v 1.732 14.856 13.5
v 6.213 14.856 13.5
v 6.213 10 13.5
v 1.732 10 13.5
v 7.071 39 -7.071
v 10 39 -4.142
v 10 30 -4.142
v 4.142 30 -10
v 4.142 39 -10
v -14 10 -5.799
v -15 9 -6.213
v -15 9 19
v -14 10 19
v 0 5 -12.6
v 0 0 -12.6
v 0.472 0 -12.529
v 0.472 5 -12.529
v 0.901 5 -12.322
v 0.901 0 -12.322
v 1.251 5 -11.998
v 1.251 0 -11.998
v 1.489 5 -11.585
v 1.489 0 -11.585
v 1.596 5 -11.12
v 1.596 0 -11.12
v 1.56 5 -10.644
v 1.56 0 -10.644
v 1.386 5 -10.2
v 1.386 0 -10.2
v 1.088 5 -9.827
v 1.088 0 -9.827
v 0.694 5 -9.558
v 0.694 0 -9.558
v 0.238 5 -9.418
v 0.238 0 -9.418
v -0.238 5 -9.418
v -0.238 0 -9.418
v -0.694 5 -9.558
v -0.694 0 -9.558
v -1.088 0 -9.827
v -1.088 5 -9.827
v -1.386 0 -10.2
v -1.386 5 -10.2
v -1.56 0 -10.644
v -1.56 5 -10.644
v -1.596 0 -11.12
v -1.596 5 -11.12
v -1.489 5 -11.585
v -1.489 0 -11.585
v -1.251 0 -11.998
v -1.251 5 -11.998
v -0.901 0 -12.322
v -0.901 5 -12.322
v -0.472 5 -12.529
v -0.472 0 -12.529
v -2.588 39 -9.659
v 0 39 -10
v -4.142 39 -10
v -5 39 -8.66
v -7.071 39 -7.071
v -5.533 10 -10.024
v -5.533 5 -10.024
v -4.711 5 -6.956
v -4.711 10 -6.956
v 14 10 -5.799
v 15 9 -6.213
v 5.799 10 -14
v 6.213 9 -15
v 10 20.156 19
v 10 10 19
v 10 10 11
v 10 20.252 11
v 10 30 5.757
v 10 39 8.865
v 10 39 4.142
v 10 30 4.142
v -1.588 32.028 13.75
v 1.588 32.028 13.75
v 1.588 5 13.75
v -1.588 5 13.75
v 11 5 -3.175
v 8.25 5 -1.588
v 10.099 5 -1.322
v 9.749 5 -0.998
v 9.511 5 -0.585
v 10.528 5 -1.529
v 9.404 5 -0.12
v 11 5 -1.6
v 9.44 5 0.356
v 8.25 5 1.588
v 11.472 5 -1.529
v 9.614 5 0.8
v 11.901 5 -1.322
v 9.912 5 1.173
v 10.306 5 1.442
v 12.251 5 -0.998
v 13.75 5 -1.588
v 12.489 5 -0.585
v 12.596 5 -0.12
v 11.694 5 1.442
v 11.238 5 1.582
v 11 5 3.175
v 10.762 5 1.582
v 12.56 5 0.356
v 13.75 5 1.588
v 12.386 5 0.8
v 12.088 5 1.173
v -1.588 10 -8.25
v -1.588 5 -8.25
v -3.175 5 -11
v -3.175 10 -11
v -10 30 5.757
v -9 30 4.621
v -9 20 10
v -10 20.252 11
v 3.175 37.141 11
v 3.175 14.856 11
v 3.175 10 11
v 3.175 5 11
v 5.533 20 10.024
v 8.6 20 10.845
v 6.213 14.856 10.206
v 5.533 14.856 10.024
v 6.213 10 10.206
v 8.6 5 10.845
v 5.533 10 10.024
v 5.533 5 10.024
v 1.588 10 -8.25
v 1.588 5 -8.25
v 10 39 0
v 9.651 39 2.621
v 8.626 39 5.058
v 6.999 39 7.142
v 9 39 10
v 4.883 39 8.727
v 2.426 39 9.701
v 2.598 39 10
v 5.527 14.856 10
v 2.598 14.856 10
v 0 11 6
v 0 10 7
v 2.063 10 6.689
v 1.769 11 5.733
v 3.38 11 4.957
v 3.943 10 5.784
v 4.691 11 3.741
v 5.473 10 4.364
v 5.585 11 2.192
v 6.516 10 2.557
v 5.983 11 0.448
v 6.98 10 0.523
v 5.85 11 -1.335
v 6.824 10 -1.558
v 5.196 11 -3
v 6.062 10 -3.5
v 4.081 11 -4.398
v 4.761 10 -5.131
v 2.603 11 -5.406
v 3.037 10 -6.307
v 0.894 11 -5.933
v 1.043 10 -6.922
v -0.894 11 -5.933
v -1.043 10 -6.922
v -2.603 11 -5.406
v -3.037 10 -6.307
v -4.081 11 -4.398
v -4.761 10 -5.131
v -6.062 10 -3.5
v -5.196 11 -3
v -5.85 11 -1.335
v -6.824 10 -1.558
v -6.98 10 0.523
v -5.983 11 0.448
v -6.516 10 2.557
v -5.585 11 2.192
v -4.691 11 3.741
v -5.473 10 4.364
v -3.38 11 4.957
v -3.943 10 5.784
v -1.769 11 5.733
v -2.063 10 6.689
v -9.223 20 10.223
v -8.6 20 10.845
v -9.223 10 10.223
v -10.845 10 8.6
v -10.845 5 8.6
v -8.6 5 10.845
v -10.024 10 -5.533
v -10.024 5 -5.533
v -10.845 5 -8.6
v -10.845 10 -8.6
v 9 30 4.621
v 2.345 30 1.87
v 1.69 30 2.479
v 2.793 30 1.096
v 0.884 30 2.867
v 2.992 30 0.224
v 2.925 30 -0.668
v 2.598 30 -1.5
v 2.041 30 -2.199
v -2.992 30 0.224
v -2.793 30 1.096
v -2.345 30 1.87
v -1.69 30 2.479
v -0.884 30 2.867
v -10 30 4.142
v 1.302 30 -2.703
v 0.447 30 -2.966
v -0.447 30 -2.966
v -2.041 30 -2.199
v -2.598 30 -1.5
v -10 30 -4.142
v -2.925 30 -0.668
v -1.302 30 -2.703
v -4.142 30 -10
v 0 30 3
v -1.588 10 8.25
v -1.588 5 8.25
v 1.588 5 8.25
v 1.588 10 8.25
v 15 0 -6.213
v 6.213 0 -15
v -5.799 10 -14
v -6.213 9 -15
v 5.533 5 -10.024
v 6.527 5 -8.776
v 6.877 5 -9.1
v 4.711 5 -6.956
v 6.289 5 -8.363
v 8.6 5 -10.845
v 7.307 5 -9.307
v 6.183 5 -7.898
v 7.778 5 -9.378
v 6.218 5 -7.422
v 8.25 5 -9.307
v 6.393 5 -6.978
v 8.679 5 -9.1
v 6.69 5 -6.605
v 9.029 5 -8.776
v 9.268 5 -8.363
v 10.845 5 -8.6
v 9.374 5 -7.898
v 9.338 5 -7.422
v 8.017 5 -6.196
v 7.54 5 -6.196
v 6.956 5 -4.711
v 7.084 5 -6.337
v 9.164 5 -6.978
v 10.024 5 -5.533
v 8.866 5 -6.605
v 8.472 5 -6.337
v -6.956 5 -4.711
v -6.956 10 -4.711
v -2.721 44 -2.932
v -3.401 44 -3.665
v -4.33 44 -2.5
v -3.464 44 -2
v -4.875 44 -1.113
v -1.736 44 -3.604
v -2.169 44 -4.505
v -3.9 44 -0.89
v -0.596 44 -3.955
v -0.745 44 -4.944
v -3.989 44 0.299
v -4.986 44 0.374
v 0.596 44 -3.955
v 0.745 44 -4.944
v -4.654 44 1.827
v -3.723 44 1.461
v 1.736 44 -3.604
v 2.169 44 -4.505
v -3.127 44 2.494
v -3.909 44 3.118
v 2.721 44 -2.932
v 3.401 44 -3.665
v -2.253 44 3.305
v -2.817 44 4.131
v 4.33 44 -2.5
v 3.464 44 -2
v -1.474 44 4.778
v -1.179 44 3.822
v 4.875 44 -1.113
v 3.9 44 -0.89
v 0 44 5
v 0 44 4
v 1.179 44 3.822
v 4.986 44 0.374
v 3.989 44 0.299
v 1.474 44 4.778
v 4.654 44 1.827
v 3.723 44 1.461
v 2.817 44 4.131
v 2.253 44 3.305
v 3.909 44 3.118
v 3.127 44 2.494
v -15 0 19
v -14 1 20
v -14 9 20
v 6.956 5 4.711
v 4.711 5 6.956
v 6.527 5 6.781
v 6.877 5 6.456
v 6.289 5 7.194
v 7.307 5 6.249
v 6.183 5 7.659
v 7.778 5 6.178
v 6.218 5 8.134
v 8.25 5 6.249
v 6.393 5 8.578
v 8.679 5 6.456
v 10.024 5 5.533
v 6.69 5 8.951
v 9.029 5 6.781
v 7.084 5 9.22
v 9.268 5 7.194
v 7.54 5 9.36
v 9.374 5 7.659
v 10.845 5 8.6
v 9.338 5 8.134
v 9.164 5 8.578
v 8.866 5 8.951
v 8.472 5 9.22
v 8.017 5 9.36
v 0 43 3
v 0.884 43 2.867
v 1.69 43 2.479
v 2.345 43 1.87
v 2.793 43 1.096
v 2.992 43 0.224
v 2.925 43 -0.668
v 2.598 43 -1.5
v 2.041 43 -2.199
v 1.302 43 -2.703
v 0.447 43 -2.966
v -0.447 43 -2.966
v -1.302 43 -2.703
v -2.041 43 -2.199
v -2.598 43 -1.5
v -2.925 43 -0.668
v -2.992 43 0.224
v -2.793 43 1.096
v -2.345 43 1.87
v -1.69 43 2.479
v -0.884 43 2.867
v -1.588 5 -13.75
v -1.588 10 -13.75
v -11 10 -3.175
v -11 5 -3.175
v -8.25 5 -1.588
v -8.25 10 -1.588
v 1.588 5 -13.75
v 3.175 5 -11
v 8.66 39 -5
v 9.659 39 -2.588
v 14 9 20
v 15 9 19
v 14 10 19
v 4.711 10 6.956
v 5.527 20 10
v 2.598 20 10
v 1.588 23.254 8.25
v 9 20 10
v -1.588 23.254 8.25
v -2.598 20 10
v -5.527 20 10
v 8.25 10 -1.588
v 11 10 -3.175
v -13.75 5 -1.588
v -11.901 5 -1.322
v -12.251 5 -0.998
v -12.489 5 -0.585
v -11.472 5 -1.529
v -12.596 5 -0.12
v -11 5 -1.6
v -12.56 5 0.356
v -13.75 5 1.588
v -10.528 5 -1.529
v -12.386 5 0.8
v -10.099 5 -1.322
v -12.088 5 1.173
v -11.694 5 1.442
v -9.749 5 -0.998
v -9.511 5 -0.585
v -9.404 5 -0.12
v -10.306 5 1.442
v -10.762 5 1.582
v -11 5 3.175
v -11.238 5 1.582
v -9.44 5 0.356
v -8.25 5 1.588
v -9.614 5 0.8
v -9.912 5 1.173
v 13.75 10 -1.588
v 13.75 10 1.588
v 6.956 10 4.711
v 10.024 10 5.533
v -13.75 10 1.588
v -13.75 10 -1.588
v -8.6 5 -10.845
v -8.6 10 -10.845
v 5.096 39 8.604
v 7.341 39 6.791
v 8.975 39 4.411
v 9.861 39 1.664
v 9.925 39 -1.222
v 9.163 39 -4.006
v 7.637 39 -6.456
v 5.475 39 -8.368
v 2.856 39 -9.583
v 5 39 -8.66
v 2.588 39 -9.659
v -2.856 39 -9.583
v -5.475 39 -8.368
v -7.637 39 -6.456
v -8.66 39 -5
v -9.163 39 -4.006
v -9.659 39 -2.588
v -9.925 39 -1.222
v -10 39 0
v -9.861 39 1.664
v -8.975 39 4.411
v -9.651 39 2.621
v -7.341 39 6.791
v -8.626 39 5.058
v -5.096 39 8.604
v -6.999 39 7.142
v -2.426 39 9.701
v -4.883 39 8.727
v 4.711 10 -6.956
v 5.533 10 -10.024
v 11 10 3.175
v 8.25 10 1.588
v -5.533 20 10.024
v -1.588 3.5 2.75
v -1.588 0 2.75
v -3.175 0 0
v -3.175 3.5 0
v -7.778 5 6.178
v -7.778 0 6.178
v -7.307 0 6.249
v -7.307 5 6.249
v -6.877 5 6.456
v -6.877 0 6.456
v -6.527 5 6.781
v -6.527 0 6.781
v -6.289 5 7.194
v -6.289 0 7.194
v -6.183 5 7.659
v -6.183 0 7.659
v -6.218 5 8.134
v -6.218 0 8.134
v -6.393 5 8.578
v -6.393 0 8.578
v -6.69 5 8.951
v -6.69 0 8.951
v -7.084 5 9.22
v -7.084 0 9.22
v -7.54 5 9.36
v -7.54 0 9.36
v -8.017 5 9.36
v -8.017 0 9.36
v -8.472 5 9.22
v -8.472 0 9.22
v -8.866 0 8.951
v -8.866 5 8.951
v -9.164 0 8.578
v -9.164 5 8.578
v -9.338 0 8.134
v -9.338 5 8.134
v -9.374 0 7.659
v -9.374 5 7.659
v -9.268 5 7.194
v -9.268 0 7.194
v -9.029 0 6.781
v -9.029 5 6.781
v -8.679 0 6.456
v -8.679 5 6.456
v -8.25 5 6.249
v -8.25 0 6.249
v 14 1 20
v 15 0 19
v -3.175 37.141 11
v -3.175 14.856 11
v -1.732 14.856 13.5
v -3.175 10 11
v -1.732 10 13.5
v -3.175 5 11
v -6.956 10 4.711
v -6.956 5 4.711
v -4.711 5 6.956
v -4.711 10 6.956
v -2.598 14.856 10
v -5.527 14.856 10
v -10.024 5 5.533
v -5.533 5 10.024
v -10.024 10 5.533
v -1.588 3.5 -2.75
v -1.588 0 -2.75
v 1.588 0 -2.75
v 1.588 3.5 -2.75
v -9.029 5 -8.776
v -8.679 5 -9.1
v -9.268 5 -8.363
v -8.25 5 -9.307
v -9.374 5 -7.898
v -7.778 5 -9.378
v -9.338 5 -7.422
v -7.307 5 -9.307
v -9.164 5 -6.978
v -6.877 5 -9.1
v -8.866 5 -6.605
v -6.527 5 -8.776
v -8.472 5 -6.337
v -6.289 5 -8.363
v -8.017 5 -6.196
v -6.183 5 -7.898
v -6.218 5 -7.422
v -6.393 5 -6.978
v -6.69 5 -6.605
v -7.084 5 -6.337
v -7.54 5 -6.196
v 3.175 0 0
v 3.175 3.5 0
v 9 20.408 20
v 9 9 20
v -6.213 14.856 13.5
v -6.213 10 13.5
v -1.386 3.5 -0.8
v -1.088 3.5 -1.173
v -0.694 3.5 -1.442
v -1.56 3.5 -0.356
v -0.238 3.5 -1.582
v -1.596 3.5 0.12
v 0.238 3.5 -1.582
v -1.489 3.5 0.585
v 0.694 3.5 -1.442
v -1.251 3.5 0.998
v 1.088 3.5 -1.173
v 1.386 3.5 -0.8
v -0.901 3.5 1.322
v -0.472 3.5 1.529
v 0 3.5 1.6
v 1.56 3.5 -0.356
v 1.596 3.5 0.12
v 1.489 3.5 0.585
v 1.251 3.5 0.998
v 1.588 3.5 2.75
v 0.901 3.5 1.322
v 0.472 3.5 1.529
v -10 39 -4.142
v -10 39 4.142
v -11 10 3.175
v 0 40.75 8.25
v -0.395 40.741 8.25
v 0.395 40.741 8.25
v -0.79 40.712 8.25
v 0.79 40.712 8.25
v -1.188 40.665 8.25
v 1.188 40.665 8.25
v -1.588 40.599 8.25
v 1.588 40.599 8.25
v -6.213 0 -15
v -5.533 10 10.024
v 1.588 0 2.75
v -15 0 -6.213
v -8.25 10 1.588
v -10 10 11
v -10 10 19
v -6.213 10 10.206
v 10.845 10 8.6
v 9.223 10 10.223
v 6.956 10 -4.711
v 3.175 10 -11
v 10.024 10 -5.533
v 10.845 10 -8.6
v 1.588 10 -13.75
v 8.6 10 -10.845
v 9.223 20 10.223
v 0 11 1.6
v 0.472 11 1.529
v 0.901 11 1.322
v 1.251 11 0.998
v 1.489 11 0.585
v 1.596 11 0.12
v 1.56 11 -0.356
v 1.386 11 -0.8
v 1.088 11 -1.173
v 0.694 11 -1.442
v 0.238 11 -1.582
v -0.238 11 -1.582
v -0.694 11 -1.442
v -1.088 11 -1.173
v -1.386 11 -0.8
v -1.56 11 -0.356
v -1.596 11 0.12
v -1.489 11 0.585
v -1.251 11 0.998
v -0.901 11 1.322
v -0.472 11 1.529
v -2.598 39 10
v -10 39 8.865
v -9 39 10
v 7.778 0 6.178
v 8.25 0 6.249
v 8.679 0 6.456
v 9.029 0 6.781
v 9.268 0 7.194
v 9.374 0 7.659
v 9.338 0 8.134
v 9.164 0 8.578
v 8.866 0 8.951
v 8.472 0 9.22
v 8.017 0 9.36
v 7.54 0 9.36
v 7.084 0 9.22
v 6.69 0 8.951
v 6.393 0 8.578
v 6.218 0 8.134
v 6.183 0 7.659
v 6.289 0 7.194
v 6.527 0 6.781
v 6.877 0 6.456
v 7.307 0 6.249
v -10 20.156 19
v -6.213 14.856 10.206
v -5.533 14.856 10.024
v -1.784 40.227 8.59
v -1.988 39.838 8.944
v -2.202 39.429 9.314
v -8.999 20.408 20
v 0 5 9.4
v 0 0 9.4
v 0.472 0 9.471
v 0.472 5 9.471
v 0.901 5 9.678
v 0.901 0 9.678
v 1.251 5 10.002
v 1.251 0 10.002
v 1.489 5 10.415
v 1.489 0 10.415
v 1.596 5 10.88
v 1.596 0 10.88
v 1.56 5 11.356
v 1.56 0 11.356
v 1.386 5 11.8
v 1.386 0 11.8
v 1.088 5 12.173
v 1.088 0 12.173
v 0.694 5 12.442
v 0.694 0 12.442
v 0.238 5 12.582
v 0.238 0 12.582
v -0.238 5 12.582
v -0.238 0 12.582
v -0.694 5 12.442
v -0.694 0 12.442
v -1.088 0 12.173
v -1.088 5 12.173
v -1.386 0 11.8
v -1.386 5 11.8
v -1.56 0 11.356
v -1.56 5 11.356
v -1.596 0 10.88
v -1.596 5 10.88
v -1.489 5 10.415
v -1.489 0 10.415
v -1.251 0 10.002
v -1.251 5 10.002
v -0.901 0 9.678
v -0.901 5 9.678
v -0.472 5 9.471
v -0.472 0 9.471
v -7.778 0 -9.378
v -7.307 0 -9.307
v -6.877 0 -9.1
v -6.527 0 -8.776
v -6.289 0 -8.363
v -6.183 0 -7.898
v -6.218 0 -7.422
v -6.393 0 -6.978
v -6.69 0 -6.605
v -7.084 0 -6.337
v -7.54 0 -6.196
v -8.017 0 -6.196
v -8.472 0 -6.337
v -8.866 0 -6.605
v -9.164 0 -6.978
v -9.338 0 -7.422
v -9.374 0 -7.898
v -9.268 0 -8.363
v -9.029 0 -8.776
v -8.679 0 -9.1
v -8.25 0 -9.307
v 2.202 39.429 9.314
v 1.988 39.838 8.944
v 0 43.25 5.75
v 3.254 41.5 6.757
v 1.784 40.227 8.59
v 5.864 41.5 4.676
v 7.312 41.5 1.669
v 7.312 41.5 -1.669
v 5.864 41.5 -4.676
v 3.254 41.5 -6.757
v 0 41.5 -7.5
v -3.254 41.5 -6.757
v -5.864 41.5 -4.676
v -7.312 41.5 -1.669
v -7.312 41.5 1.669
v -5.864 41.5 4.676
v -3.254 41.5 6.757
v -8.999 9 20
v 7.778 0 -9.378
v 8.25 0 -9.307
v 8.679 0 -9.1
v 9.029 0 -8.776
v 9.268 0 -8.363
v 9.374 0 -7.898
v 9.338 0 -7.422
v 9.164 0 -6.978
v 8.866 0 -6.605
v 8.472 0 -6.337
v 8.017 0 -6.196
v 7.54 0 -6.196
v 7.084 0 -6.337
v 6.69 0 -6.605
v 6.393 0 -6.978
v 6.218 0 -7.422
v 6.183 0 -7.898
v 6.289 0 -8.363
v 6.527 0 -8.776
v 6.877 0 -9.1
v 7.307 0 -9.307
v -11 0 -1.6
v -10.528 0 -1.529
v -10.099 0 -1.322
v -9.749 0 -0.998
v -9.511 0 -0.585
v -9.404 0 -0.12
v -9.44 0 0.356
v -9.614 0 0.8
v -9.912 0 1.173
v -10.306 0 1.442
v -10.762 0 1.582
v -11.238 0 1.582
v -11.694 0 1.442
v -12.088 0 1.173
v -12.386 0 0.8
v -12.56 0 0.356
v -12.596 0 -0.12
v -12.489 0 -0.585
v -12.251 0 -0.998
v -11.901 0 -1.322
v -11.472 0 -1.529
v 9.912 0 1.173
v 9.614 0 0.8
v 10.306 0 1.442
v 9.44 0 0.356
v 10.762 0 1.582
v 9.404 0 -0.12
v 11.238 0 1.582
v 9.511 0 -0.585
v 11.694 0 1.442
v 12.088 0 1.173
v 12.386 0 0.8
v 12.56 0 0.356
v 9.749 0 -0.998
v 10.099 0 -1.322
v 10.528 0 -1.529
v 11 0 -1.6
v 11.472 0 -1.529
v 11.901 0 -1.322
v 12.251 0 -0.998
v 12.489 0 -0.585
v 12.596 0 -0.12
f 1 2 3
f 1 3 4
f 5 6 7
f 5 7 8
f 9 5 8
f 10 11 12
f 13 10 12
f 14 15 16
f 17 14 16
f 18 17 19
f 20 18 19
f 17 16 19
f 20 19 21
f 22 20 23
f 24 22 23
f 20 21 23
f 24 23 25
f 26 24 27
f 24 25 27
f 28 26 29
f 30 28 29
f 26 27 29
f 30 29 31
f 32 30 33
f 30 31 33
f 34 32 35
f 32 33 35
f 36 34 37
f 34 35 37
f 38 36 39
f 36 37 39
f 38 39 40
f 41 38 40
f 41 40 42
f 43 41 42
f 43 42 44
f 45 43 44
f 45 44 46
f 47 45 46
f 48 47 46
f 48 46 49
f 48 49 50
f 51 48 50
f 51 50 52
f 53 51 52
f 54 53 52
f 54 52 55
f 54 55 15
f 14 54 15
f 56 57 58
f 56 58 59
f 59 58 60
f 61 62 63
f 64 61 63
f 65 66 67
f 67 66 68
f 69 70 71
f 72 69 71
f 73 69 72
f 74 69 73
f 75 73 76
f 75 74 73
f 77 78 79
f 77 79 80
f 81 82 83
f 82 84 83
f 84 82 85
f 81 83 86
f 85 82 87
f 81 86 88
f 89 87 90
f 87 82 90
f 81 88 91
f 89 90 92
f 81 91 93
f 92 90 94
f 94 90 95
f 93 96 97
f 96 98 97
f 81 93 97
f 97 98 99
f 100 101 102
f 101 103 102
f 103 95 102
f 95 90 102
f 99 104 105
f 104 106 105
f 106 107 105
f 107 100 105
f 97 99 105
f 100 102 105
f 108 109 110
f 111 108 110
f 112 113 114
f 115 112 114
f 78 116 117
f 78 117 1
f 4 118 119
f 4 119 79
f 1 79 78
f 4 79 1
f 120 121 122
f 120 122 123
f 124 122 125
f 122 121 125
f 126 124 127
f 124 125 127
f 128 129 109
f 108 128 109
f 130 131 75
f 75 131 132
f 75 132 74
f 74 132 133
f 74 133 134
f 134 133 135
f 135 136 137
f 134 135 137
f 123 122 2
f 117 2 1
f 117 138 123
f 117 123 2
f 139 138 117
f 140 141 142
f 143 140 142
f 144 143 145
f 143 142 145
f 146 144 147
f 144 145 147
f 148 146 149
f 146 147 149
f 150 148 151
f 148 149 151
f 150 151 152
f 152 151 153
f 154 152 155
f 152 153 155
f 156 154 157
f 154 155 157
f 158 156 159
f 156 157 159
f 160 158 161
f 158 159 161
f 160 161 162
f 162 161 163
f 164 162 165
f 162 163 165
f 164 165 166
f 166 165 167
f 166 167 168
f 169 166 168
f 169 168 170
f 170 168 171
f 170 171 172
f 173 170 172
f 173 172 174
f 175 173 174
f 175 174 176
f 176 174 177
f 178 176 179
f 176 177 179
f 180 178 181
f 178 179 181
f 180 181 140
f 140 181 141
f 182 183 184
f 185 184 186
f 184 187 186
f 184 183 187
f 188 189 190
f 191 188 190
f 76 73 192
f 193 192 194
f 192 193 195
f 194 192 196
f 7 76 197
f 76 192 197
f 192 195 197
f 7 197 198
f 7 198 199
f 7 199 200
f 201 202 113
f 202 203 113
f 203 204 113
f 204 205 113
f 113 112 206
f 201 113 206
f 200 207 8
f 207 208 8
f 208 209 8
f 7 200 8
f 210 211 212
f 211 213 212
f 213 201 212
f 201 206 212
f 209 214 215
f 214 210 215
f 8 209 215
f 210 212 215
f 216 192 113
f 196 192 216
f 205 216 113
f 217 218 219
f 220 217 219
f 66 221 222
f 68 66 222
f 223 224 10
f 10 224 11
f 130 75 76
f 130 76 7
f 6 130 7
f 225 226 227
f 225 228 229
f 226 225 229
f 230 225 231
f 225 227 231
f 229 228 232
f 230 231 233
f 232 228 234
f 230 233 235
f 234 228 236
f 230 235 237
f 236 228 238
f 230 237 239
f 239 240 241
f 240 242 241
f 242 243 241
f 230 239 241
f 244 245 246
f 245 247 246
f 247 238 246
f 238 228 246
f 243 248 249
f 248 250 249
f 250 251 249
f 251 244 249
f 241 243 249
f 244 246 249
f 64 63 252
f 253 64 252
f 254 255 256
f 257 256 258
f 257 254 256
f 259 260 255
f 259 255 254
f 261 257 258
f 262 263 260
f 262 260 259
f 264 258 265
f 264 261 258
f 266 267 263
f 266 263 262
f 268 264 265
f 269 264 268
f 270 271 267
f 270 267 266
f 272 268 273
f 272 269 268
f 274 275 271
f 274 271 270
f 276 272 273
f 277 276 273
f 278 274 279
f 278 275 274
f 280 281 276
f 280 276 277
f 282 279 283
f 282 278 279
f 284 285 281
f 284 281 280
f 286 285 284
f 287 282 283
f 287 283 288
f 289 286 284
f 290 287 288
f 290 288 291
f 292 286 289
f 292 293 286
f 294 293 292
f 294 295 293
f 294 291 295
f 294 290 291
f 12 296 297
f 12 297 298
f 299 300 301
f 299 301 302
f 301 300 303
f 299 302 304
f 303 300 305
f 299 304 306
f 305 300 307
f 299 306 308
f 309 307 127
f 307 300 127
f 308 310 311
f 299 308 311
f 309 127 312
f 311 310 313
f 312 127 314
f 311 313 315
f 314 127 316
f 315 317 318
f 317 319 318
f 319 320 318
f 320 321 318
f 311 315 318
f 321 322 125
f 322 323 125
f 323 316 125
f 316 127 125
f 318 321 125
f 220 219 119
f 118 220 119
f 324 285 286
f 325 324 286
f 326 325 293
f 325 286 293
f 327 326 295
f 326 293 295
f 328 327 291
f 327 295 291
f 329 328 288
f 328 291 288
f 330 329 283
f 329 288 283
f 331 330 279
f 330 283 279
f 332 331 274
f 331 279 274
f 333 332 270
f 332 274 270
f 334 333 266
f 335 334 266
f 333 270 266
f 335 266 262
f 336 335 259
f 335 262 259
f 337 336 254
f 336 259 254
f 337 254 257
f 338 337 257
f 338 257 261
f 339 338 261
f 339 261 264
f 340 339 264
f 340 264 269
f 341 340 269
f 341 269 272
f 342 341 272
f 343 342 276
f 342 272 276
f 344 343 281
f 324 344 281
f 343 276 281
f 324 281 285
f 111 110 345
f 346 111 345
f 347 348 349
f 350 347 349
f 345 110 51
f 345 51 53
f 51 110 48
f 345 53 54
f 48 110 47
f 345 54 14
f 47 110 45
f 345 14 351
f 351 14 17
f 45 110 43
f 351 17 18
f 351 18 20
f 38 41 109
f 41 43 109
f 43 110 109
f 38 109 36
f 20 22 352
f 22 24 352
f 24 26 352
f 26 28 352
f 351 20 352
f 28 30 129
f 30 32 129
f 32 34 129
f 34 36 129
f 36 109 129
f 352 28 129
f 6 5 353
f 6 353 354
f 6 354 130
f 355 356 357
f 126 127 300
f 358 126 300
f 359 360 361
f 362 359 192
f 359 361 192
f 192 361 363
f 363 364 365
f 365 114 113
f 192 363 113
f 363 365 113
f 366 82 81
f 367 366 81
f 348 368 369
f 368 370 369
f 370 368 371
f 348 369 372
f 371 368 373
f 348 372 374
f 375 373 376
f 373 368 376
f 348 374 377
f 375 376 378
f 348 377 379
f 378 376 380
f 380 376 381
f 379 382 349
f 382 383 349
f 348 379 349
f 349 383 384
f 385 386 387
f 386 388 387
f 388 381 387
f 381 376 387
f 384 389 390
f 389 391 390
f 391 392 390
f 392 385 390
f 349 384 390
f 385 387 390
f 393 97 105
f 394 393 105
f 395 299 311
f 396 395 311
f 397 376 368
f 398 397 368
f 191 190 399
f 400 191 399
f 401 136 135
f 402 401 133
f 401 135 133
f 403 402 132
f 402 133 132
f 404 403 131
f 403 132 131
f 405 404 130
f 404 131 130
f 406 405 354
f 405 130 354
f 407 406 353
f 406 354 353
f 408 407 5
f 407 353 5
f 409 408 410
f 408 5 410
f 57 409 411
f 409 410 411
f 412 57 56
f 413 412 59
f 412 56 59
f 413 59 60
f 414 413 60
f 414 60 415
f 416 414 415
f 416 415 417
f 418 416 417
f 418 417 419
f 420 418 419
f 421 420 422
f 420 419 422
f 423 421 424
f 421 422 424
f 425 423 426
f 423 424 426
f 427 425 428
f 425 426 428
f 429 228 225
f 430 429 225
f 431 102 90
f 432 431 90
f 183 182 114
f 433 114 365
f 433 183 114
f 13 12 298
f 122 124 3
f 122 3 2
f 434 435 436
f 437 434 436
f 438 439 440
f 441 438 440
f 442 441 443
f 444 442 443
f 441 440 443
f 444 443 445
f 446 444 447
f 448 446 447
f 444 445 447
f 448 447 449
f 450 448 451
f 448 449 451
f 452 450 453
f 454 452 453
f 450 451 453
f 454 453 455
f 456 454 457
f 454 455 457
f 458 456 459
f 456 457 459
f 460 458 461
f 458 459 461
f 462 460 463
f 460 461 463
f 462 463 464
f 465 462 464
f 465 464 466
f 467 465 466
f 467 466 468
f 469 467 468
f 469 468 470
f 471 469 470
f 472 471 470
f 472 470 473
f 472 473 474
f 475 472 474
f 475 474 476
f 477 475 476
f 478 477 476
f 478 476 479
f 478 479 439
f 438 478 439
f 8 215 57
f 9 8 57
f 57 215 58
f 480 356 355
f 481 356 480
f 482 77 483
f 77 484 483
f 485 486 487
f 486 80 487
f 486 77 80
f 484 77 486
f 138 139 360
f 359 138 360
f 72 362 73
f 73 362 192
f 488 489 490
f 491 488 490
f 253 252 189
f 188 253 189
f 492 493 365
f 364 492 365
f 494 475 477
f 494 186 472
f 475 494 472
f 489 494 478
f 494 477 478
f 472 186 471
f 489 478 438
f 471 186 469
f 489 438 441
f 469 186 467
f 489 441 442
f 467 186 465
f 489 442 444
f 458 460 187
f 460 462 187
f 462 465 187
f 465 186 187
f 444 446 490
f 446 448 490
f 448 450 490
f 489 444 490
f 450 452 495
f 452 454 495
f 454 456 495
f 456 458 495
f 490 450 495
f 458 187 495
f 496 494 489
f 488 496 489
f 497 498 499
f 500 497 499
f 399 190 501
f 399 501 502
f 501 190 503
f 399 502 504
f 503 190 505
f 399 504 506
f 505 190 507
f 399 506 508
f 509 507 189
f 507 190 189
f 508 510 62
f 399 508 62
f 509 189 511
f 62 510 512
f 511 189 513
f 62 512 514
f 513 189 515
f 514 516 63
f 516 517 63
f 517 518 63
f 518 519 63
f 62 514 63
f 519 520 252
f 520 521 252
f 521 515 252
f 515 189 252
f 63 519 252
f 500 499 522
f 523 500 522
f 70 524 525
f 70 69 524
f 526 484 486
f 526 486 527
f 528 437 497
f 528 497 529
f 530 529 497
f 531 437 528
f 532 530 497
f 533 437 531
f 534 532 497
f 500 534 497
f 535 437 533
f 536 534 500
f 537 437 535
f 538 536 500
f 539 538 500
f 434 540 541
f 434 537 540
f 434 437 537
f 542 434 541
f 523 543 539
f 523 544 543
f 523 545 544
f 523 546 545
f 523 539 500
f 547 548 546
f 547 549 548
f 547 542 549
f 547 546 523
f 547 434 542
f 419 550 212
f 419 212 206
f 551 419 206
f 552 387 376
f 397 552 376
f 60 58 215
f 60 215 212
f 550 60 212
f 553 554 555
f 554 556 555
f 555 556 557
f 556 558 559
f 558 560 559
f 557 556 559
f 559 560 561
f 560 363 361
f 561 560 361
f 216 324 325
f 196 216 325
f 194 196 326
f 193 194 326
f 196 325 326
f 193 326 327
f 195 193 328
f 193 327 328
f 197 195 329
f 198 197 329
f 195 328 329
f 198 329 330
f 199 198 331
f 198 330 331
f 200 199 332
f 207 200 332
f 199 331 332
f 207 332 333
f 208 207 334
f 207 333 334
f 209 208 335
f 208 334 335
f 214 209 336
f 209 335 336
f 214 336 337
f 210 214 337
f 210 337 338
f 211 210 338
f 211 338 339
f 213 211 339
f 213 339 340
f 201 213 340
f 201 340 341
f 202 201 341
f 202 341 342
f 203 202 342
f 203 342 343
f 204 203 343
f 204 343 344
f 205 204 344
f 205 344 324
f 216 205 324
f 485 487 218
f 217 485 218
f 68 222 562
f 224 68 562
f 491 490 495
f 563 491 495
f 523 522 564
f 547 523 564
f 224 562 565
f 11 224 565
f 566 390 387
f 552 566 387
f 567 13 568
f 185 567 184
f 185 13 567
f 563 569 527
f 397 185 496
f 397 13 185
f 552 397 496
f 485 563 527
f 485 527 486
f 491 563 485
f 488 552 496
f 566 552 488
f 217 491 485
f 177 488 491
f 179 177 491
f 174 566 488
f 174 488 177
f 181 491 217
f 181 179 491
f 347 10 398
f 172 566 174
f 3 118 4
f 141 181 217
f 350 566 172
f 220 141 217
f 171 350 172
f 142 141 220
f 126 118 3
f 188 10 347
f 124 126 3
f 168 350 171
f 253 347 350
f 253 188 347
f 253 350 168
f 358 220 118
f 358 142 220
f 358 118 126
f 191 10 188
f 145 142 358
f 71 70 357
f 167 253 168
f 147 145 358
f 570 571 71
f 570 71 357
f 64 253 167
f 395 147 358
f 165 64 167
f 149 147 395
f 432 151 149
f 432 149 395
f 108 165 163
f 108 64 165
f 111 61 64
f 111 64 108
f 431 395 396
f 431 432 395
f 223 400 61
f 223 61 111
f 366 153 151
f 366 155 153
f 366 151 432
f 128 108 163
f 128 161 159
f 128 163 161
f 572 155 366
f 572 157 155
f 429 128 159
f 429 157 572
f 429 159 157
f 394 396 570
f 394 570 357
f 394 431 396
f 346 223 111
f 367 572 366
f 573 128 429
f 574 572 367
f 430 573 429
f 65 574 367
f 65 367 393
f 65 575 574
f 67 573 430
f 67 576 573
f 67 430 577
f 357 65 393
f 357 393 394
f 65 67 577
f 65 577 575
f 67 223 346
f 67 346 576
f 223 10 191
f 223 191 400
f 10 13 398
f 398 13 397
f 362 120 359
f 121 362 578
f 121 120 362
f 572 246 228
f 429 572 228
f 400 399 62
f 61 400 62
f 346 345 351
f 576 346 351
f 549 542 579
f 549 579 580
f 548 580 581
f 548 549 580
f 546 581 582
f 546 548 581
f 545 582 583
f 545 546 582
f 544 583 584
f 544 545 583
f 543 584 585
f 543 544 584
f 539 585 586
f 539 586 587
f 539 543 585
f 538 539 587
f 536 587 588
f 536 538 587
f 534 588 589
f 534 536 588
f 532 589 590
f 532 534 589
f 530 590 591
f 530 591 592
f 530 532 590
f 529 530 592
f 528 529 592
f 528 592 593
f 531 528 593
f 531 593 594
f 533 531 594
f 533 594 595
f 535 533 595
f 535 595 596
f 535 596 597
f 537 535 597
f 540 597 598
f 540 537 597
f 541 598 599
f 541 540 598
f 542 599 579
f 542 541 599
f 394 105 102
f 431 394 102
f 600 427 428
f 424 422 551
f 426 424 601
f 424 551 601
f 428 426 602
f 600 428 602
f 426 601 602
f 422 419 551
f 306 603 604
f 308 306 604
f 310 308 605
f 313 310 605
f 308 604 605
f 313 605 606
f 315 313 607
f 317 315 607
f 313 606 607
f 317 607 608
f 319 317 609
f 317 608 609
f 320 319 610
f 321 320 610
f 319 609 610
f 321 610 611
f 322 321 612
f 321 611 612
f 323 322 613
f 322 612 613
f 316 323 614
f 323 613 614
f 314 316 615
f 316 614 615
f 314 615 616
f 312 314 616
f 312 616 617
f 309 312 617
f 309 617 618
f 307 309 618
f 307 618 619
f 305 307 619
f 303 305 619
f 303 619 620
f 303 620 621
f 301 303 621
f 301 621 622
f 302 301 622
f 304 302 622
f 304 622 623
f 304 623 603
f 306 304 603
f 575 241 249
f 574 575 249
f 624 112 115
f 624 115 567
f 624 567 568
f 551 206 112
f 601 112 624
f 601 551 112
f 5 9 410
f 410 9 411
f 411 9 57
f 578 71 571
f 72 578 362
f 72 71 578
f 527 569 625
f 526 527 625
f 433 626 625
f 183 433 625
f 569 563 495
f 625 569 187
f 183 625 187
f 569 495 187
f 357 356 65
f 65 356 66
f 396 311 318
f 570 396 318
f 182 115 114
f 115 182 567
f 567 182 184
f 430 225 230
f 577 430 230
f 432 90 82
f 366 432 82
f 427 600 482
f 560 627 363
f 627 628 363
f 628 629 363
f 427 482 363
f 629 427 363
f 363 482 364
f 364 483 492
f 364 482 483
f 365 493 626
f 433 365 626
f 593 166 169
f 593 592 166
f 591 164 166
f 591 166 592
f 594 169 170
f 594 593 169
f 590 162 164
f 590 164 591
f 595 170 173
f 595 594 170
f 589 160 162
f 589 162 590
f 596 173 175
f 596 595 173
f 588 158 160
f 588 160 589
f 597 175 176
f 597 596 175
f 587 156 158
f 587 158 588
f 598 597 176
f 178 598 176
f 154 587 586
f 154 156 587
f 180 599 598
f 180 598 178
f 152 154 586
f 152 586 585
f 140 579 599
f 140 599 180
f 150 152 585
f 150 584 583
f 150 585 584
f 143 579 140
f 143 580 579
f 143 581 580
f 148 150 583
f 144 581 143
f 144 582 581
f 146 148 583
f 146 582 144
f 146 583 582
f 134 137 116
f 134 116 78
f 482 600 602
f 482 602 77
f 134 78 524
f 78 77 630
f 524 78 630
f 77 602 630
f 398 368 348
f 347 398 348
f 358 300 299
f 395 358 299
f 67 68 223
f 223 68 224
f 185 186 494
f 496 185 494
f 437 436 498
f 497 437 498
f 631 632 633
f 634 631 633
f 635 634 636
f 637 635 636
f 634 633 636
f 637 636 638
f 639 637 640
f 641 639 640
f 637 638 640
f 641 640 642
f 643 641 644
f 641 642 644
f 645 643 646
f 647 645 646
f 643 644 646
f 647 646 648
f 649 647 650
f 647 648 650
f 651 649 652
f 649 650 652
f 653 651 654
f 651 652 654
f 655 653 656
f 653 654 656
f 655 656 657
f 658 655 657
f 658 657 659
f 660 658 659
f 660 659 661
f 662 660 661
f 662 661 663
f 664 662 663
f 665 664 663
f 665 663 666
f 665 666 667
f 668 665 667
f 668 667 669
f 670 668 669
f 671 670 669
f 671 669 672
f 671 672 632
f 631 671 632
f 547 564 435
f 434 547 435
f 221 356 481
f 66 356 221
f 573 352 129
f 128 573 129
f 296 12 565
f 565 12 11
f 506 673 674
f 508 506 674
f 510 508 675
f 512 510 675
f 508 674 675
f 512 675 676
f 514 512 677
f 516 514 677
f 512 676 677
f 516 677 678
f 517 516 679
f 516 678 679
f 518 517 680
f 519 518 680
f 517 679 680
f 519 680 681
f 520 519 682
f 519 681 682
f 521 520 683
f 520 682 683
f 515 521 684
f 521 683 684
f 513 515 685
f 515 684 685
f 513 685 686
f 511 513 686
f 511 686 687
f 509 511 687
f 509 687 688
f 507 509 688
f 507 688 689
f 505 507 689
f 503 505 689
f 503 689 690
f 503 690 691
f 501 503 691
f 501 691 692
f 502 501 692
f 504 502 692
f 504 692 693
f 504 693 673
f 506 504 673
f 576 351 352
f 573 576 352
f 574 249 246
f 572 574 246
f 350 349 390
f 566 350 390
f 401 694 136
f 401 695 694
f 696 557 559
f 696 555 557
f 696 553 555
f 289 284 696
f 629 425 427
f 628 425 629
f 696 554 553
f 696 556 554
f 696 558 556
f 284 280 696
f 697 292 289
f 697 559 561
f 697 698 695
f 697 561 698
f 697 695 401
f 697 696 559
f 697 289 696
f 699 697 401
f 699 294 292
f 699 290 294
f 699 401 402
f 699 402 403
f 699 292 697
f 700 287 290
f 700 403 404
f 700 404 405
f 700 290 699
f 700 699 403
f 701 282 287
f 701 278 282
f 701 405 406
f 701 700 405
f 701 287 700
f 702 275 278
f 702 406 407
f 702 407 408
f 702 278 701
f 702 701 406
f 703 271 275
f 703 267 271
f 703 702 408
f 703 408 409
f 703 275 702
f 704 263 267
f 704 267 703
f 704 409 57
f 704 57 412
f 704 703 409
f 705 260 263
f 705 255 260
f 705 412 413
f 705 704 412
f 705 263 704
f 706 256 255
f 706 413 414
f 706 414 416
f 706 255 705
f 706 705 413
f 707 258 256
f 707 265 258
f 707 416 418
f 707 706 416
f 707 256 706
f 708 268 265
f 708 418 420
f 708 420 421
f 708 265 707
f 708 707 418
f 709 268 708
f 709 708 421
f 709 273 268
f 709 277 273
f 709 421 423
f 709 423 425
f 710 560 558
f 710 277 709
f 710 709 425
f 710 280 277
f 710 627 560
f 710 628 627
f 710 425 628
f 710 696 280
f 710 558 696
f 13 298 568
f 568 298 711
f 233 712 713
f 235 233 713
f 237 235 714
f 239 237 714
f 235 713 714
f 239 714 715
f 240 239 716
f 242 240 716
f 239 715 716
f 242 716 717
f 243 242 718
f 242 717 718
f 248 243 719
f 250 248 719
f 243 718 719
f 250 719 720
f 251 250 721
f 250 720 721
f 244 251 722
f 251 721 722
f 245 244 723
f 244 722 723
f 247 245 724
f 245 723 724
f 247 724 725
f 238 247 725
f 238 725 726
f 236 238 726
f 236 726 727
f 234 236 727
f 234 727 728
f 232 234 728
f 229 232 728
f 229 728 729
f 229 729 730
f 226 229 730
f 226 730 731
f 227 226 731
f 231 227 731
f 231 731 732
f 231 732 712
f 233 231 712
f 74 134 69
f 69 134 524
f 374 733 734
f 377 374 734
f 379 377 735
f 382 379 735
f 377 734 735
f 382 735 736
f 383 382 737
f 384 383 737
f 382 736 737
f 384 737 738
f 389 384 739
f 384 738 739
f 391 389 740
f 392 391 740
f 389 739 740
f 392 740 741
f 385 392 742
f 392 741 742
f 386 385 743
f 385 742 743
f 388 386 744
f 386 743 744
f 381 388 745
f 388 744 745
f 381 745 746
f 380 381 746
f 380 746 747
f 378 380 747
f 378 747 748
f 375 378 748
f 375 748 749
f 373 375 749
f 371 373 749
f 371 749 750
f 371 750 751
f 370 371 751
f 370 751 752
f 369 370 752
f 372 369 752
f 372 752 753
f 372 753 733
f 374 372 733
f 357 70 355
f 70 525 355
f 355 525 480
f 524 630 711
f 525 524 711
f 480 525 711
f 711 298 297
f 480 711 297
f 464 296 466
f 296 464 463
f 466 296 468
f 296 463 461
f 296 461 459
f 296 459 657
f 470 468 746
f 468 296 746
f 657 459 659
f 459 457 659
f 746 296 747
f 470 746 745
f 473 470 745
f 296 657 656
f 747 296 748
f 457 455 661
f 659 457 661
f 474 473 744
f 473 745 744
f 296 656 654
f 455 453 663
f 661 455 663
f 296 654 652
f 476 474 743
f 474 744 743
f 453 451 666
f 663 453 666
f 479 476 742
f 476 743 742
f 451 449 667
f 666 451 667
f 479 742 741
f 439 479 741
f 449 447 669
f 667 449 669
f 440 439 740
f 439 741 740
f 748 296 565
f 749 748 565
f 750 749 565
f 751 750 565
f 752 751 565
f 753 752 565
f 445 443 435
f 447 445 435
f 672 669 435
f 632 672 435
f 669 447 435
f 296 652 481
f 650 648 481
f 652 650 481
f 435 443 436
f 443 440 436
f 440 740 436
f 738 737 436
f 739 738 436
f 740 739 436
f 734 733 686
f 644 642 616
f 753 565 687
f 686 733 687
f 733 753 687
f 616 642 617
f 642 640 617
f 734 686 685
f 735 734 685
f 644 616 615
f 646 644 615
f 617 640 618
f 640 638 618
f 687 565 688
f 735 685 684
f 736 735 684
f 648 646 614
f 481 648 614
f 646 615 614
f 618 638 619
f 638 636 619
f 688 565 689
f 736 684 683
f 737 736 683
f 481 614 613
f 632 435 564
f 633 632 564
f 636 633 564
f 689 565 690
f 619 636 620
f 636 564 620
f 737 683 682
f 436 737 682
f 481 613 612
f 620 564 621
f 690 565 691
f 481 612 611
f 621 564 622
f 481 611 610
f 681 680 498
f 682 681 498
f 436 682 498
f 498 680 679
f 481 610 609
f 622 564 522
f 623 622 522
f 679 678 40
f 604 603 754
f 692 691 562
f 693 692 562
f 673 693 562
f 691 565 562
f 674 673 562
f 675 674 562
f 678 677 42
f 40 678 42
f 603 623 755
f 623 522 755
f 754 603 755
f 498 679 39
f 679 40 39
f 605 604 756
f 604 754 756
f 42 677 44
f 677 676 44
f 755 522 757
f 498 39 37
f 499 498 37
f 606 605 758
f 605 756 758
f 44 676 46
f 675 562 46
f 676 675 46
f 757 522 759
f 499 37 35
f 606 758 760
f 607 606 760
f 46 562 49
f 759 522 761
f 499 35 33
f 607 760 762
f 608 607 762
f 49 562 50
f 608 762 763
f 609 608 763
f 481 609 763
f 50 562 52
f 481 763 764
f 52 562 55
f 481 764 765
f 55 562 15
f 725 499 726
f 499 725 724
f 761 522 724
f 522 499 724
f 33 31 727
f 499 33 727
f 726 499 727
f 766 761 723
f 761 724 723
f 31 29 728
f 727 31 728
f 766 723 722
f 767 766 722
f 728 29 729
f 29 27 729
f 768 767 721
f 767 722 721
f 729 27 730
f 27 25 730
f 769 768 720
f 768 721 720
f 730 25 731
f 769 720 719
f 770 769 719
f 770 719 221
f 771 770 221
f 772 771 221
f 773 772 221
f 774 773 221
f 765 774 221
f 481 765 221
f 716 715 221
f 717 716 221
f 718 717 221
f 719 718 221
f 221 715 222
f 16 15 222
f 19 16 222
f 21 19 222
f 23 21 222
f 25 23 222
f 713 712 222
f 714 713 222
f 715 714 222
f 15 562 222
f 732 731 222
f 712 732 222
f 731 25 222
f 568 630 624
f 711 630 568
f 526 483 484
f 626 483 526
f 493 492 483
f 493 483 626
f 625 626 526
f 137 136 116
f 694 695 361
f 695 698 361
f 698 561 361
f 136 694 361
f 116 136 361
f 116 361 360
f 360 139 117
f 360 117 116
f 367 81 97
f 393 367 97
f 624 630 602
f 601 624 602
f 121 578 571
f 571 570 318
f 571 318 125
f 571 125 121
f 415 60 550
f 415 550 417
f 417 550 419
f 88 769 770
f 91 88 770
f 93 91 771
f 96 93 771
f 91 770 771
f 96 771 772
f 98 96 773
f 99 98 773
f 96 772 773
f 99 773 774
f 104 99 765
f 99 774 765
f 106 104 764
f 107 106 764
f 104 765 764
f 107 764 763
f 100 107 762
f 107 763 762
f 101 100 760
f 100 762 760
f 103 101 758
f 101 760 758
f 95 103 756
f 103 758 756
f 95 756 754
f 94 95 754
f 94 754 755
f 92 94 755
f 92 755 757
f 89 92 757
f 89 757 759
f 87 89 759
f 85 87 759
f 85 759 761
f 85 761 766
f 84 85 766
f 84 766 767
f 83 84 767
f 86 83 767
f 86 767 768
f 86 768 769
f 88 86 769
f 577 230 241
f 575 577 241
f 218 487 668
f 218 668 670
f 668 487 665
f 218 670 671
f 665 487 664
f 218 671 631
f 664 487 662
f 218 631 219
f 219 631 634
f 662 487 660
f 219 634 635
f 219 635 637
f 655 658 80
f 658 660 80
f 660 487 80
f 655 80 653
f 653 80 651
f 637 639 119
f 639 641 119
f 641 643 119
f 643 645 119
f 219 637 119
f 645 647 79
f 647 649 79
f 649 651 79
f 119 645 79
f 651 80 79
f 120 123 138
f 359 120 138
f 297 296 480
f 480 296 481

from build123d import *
from OCP.BRepFilletAPI import BRepFilletAPI_MakeChamfer

# Parameters (mm, degrees)
CROQUIS1_R              = 1.6
SALIENTE_EXTRUIR1_DEPTH = 10
SALIENTE_EXTRUIR2_DEPTH = 30
CROQUIS12_W             = 12.426406872
CROQUIS12_H             = 4.855948251
CORTAR_EXTRUIR7_DEPTH   = 3.5
CROQUIS3_OUTSIDE_W      = 44.076
CROQUIS3_OUTSIDE_H      = 49.076
CROQUIS3_OUTSIDE_R      = 1.6
CORTAR_EXTRUIR1_DEPTH   = 29
CROQUIS4_R              = 10
SALIENTE_EXTRUIR3_DEPTH = 5
CHAFL_N1_SIZE           = 5
CROQUIS6_R              = 1.6
CORTAR_EXTRUIR3_DEPTH   = 10
CROQUIS8_R              = 6
CROQUIS8_R_2            = 1.6
SALIENTE_EXTRUIR4_DEPTH = 1
CHAFL_N2_SIZE           = 1
CROQUIS5_R              = 3
CORTAR_EXTRUIR4_DEPTH   = 33
CHAFL_N3_SIZE           = 1
CHAFL_N3_SIZE2          = 1.000027611
CHAFL_N3_SIZE2_2        = 1.000000257
CHAFL_N3_SIZE2_3        = 0.999999743
CHAFL_N3_SIZE2_4        = 0.999999708
CHAFL_N3_SIZE2_5        = 1.000000292
CHAFL_N3_SIZE2_6        = 0.999968652
CHAFL_N3_SIZE2_7        = 0.999972392
CHAFL_N3_SIZE2_8        = 1.000031351
CORTAR_EXTRUIR5_START   = -5
CORTAR_EXTRUIR5_DEPTH   = 15
CORTAR_EXTRUIR8_DEPTH   = 48.759815826
CHAFL_N4_SIZE           = 1
CORTAR_EXTRUIR6_DEPTH   = 3.5


with BuildPart() as part:
    # Croquis1 → Saliente-Extruir1 (new body)
    with BuildSketch(Plane(origin=(0, 0, 0), x_dir=(1, 0, 0), z_dir=(0, 1, 0))):
        Polygon((-15, -6.213203436), (-15, -20), (15, -20), (15, -6.213203436), (15, 6.213203436), (6.213203436, 15), (-6.213203436, 15), (-15, 6.213203436), align=None)
        with Locations(Location((0, 0, 0), (0, 0, 270))):
            Circle(CROQUIS1_R, mode=Mode.SUBTRACT)
    extrude(amount=SALIENTE_EXTRUIR1_DEPTH)

    # Croquis2 → Saliente-Extruir2 (add)
    with BuildSketch(Plane.ZY.offset(15)):
        Polygon((10, 20), (4.621471258, 30), (-10, 30), (-10, 39), (10, 39), (20, 20.407554966), (20, 10), (10, 10), align=None)
    extrude(amount=-SALIENTE_EXTRUIR2_DEPTH)

    # Croquis12 → Cortar-Extruir7 (cut)
    with BuildSketch(Plane(origin=(0, 0, 10), x_dir=(-1, 0, 0), z_dir=(0, 0, -1))):
        with Locations((0, 12.427974126)):
            Rectangle(CROQUIS12_W, CROQUIS12_H)
    extrude(amount=-CORTAR_EXTRUIR7_DEPTH, mode=Mode.SUBTRACT)

    # Croquis3 outside → Cortar-Extruir1 (cut)
    # profile 1 of 2: a face of its own
    with BuildSketch(Plane(origin=(0, 39, 0), x_dir=(1, 0, 0), z_dir=(0, 1, 0))):
        with Locations((0, -2.5)):
            Rectangle(CROQUIS3_OUTSIDE_W, CROQUIS3_OUTSIDE_H)
        Polygon((-10, -4.142135624), (-9.999502859, -20), (9.999995364, -20), (10, -4.142135624), (10, 4.142135624), (4.142135624, 10), (-4.142135624, 10), (-10, 4.142135624), align=None, mode=Mode.SUBTRACT)
    # profile 2 of 2: a face of its own
    with BuildSketch(Plane(origin=(0, 39, 0), x_dir=(1, 0, 0), z_dir=(0, 1, 0))):
        with Locations(Location((0, 0, 0), (0, 0, 270))):
            Circle(CROQUIS3_OUTSIDE_R)
    extrude(amount=-CORTAR_EXTRUIR1_DEPTH, mode=Mode.SUBTRACT)

    # Croquis4 → Saliente-Extruir3 (add)
    with BuildSketch(Plane(origin=(0, 39, 0), x_dir=(1, 0, 0), z_dir=(0, 1, 0))):
        with Locations(Location((0, 0, 0), (0, 0, 270))):
            Circle(CROQUIS4_R)
    extrude(amount=SALIENTE_EXTRUIR3_DEPTH)

    # Chaflán1
    chafl_n1_edges = [part.edges().sort_by_distance(p)[0] for p in [
        (0, 44, -10),
    ]]
    chamfer(chafl_n1_edges, length=CHAFL_N1_SIZE - 0.0001)  # a hair under: the kernel refuses the full size

    # Croquis6 → Cortar-Extruir3 (cut)
    with BuildSketch(Plane.XZ):
        with Locations(Location((0, 11, 0), (0, 0, 270))):
            Circle(CROQUIS6_R)
        with Locations(Location((7.778174593, 7.778174593, 0), (0, 0, 270))):
            Circle(CROQUIS6_R)
        with Locations(Location((11, 0, 0), (0, 0, 270))):
            Circle(CROQUIS6_R)
        with Locations(Location((7.778174593, -7.778174593, 0), (0, 0, 270))):
            Circle(CROQUIS6_R)
        with Locations(Location((0, -11, 0), (0, 0, 270))):
            Circle(CROQUIS6_R)
        with Locations(Location((-7.778174593, -7.778174593, 0), (0, 0, 270))):
            Circle(CROQUIS6_R)
        with Locations(Location((-11, 0, 0), (0, 0, 270))):
            Circle(CROQUIS6_R)
        with Locations(Location((-7.778174593, 7.778174593, 0), (0, 0, 270))):
            Circle(CROQUIS6_R)
    extrude(amount=-CORTAR_EXTRUIR3_DEPTH, mode=Mode.SUBTRACT)

    # Croquis8 → Saliente-Extruir4 (add)
    with BuildSketch(Plane(origin=(0, 10, 0), x_dir=(1, 0, 0), z_dir=(0, 1, 0))):
        with Locations(Location((0, 0, 0), (0, 0, 270))):
            Circle(CROQUIS8_R)
        with Locations(Location((0, 0, 0), (0, 0, 270))):
            Circle(CROQUIS8_R_2, mode=Mode.SUBTRACT)
    extrude(amount=SALIENTE_EXTRUIR4_DEPTH)

    # Chaflán2
    chafl_n2_edges = [part.edges().sort_by_distance(p)[0] for p in [
        (0, 10, -6),
    ]]
    chamfer(chafl_n2_edges, length=CHAFL_N2_SIZE - 0.0001)  # a hair under: the kernel refuses the full size

    # Croquis5 → Cortar-Extruir4 (cut)
    with BuildSketch(Plane(origin=(0, 44, 0), x_dir=(1, 0, 0), z_dir=(0, 1, 0))):
        with Locations(Location((0, 0, 0), (0, 0, 270))):
            Circle(CROQUIS5_R)
    extrude(amount=-CORTAR_EXTRUIR4_DEPTH, mode=Mode.SUBTRACT)

    # Chaflán3: one chamfer whose edges measure the first distance from different faces: ONE call of the kernel's chamfer builder (chamfer() names one face for all edges)
    chafl_n3_edges_1 = [part.edges().sort_by_distance(p)[0] for p in [
        (10.606601718, 10, -10.606601718),
        (0, 10, -15),
        (-10.606601718, 10, -10.606601718),
        (-15, 10, 6.893398282),
        (15, 10, 6.893398282),
        (15, 5, 20),
        (-15, 5, 20),
        (0, 0, 20),
        (-12.499751429, 10, 20),
        (12.499997682, 10, 20),
    ]]
    chafl_n3_edges_2 = [part.edges().sort_by_distance(p)[0] for p in [
        (-9.999659608, 29.703777483, 15),
    ]]
    chafl_n3_side_2 = [part.faces().sort_by_distance(p)[0] for p in [
        (-9.999745235, 23.826424788, 12.268639946),
    ]]
    chafl_n3_edges_3 = [part.edges().sort_by_distance(p)[0] for p in [
        (9.999996825, 29.703777483, 15),
    ]]
    chafl_n3_side_3 = [part.faces().sort_by_distance(p)[0] for p in [
        (9.999997624, 23.826424788, 12.268639946),
    ]]
    chafl_n3_edges_4 = [part.edges().sort_by_distance(p)[0] for p in [
        (9.999999074, 25, 7.310735629),
    ]]
    chafl_n3_side_4 = [part.faces().sort_by_distance(p)[0] for p in [
        (9.999997624, 23.826424788, 12.268639946),
    ]]
    chafl_n3_edges_5 = [part.edges().sort_by_distance(p)[0] for p in [
        (9.999998287, 15, 10),
    ]]
    chafl_n3_side_5 = [part.faces().sort_by_distance(p)[0] for p in [
        (0.000130269, 16.111309081, 10),
    ]]
    chafl_n3_edges_6 = [part.edges().sort_by_distance(p)[0] for p in [
        (9.999995364, 15.203777483, 20),
    ]]
    chafl_n3_side_6 = [part.faces().sort_by_distance(p)[0] for p in [
        (0.00010087, 9.179654523, 20),
    ]]
    chafl_n3_edges_7 = [part.edges().sort_by_distance(p)[0] for p in [
        (-9.999816357, 15, 10),
    ]]
    chafl_n3_side_7 = [part.faces().sort_by_distance(p)[0] for p in [
        (-9.999745235, 23.826424788, 12.268639946),
    ]]
    chafl_n3_edges_8 = [part.edges().sort_by_distance(p)[0] for p in [
        (-9.999900665, 25, 7.310735629),
    ]]
    chafl_n3_side_8 = [part.faces().sort_by_distance(p)[0] for p in [
        (-9.999745235, 23.826424788, 12.268639946),
    ]]
    chafl_n3_edges_9 = [part.edges().sort_by_distance(p)[0] for p in [
        (-9.999502859, 15.203777483, 20),
    ]]
    chafl_n3_side_9 = [part.faces().sort_by_distance(p)[0] for p in [
        (-9.999745235, 23.826424788, 12.268639946),
    ]]
    chafl_n3 = BRepFilletAPI_MakeChamfer(part.part.solid().wrapped)
    for e in chafl_n3_edges_1:
        chafl_n3.Add(CHAFL_N3_SIZE, e.wrapped)
    for e in chafl_n3_edges_2:
        chafl_n3.Add(CHAFL_N3_SIZE, CHAFL_N3_SIZE2, e.wrapped, chafl_n3_side_2[0].wrapped)  # the first distance lies on this face
    for e in chafl_n3_edges_3:
        chafl_n3.Add(CHAFL_N3_SIZE, CHAFL_N3_SIZE2_2, e.wrapped, chafl_n3_side_3[0].wrapped)  # the first distance lies on this face
    for e in chafl_n3_edges_4:
        chafl_n3.Add(CHAFL_N3_SIZE, CHAFL_N3_SIZE2_3, e.wrapped, chafl_n3_side_4[0].wrapped)  # the first distance lies on this face
    for e in chafl_n3_edges_5:
        chafl_n3.Add(CHAFL_N3_SIZE, CHAFL_N3_SIZE2_4, e.wrapped, chafl_n3_side_5[0].wrapped)  # the first distance lies on this face
    for e in chafl_n3_edges_6:
        chafl_n3.Add(CHAFL_N3_SIZE, CHAFL_N3_SIZE2_5, e.wrapped, chafl_n3_side_6[0].wrapped)  # the first distance lies on this face
    for e in chafl_n3_edges_7:
        chafl_n3.Add(CHAFL_N3_SIZE, CHAFL_N3_SIZE2_6, e.wrapped, chafl_n3_side_7[0].wrapped)  # the first distance lies on this face
    for e in chafl_n3_edges_8:
        chafl_n3.Add(CHAFL_N3_SIZE, CHAFL_N3_SIZE2_7, e.wrapped, chafl_n3_side_8[0].wrapped)  # the first distance lies on this face
    for e in chafl_n3_edges_9:
        chafl_n3.Add(CHAFL_N3_SIZE, CHAFL_N3_SIZE2_8, e.wrapped, chafl_n3_side_9[0].wrapped)  # the first distance lies on this face
    add(Compound.cast(chafl_n3.Shape()), mode=Mode.REPLACE)

    # Croquis9 → Cortar-Extruir5 (cut)
    with BuildSketch(Plane.XZ.offset(CORTAR_EXTRUIR5_START)):
        Polygon((-10.023540191, -5.532808996), (-10.84540104, -8.600035443), (-8.600035443, -10.84540104), (-5.532808995, -10.023540191), (-4.710948146, -6.956313744), (-6.956313744, -4.710948146), align=None)
        Polygon((-3.175426481, -11), (-1.58771324, -13.75), (1.58771324, -13.75), (3.175426481, -11), (1.58771324, -8.25), (-1.58771324, -8.25), align=None)
        Polygon((-11, 3.175426481), (-13.75, 1.58771324), (-13.75, -1.58771324), (-11, -3.175426481), (-8.25, -1.58771324), (-8.25, 1.58771324), align=None)
        Polygon((-5.532808996, 10.023540191), (-8.600035443, 10.84540104), (-10.84540104, 8.600035443), (-10.023540191, 5.532808995), (-6.956313744, 4.710948146), (-4.710948146, 6.956313744), align=None)
        Polygon((3.175426481, 11), (1.58771324, 13.75), (-1.58771324, 13.75), (-3.175426481, 11), (-1.58771324, 8.25), (1.58771324, 8.25), align=None)
        Polygon((10.023540191, 5.532808996), (10.84540104, 8.600035443), (8.600035443, 10.84540104), (5.532808995, 10.023540191), (4.710948146, 6.956313744), (6.956313744, 4.710948146), align=None)
        Polygon((11, -3.175426481), (13.75, -1.58771324), (13.75, 1.58771324), (11, 3.175426481), (8.25, 1.58771324), (8.25, -1.58771324), align=None)
        Polygon((5.532808996, -10.023540191), (8.600035443, -10.84540104), (10.84540104, -8.600035443), (10.023540191, -5.532808995), (6.956313744, -4.710948146), (4.710948146, -6.956313744), align=None)
    extrude(amount=-CORTAR_EXTRUIR5_DEPTH, mode=Mode.SUBTRACT)

    # Croquis13 → Cortar-Extruir8 (cut, through all)
    with BuildSketch(Plane(origin=(0, 10, -10), x_dir=(-1, 0, 0), z_dir=(0, -1, 0))):
        Polygon((-3.175426481, -21), (-1.58771324, -23.75), (1.58771324, -23.75), (3.175426481, -21), (1.58771324, -18.25), (-1.58771324, -18.25), align=None)
    extrude(amount=-CORTAR_EXTRUIR8_DEPTH, mode=Mode.SUBTRACT)

    # Chaflán4
    chafl_n4_edges = [part.edges().sort_by_distance(p)[0] for p in [
        (0, 44, -3),
    ]]
    chamfer(chafl_n4_edges, length=CHAFL_N4_SIZE)

    # Croquis10 → Cortar-Extruir6 (cut)
    with BuildSketch(Plane.XZ):
        Polygon((3.175426481, 0), (1.58771324, 2.75), (-1.58771324, 2.75), (-3.175426481, 0), (-1.58771324, -2.75), (1.58771324, -2.75), align=None)
    extrude(amount=-CORTAR_EXTRUIR6_DEPTH, mode=Mode.SUBTRACT)


solid = part.part
